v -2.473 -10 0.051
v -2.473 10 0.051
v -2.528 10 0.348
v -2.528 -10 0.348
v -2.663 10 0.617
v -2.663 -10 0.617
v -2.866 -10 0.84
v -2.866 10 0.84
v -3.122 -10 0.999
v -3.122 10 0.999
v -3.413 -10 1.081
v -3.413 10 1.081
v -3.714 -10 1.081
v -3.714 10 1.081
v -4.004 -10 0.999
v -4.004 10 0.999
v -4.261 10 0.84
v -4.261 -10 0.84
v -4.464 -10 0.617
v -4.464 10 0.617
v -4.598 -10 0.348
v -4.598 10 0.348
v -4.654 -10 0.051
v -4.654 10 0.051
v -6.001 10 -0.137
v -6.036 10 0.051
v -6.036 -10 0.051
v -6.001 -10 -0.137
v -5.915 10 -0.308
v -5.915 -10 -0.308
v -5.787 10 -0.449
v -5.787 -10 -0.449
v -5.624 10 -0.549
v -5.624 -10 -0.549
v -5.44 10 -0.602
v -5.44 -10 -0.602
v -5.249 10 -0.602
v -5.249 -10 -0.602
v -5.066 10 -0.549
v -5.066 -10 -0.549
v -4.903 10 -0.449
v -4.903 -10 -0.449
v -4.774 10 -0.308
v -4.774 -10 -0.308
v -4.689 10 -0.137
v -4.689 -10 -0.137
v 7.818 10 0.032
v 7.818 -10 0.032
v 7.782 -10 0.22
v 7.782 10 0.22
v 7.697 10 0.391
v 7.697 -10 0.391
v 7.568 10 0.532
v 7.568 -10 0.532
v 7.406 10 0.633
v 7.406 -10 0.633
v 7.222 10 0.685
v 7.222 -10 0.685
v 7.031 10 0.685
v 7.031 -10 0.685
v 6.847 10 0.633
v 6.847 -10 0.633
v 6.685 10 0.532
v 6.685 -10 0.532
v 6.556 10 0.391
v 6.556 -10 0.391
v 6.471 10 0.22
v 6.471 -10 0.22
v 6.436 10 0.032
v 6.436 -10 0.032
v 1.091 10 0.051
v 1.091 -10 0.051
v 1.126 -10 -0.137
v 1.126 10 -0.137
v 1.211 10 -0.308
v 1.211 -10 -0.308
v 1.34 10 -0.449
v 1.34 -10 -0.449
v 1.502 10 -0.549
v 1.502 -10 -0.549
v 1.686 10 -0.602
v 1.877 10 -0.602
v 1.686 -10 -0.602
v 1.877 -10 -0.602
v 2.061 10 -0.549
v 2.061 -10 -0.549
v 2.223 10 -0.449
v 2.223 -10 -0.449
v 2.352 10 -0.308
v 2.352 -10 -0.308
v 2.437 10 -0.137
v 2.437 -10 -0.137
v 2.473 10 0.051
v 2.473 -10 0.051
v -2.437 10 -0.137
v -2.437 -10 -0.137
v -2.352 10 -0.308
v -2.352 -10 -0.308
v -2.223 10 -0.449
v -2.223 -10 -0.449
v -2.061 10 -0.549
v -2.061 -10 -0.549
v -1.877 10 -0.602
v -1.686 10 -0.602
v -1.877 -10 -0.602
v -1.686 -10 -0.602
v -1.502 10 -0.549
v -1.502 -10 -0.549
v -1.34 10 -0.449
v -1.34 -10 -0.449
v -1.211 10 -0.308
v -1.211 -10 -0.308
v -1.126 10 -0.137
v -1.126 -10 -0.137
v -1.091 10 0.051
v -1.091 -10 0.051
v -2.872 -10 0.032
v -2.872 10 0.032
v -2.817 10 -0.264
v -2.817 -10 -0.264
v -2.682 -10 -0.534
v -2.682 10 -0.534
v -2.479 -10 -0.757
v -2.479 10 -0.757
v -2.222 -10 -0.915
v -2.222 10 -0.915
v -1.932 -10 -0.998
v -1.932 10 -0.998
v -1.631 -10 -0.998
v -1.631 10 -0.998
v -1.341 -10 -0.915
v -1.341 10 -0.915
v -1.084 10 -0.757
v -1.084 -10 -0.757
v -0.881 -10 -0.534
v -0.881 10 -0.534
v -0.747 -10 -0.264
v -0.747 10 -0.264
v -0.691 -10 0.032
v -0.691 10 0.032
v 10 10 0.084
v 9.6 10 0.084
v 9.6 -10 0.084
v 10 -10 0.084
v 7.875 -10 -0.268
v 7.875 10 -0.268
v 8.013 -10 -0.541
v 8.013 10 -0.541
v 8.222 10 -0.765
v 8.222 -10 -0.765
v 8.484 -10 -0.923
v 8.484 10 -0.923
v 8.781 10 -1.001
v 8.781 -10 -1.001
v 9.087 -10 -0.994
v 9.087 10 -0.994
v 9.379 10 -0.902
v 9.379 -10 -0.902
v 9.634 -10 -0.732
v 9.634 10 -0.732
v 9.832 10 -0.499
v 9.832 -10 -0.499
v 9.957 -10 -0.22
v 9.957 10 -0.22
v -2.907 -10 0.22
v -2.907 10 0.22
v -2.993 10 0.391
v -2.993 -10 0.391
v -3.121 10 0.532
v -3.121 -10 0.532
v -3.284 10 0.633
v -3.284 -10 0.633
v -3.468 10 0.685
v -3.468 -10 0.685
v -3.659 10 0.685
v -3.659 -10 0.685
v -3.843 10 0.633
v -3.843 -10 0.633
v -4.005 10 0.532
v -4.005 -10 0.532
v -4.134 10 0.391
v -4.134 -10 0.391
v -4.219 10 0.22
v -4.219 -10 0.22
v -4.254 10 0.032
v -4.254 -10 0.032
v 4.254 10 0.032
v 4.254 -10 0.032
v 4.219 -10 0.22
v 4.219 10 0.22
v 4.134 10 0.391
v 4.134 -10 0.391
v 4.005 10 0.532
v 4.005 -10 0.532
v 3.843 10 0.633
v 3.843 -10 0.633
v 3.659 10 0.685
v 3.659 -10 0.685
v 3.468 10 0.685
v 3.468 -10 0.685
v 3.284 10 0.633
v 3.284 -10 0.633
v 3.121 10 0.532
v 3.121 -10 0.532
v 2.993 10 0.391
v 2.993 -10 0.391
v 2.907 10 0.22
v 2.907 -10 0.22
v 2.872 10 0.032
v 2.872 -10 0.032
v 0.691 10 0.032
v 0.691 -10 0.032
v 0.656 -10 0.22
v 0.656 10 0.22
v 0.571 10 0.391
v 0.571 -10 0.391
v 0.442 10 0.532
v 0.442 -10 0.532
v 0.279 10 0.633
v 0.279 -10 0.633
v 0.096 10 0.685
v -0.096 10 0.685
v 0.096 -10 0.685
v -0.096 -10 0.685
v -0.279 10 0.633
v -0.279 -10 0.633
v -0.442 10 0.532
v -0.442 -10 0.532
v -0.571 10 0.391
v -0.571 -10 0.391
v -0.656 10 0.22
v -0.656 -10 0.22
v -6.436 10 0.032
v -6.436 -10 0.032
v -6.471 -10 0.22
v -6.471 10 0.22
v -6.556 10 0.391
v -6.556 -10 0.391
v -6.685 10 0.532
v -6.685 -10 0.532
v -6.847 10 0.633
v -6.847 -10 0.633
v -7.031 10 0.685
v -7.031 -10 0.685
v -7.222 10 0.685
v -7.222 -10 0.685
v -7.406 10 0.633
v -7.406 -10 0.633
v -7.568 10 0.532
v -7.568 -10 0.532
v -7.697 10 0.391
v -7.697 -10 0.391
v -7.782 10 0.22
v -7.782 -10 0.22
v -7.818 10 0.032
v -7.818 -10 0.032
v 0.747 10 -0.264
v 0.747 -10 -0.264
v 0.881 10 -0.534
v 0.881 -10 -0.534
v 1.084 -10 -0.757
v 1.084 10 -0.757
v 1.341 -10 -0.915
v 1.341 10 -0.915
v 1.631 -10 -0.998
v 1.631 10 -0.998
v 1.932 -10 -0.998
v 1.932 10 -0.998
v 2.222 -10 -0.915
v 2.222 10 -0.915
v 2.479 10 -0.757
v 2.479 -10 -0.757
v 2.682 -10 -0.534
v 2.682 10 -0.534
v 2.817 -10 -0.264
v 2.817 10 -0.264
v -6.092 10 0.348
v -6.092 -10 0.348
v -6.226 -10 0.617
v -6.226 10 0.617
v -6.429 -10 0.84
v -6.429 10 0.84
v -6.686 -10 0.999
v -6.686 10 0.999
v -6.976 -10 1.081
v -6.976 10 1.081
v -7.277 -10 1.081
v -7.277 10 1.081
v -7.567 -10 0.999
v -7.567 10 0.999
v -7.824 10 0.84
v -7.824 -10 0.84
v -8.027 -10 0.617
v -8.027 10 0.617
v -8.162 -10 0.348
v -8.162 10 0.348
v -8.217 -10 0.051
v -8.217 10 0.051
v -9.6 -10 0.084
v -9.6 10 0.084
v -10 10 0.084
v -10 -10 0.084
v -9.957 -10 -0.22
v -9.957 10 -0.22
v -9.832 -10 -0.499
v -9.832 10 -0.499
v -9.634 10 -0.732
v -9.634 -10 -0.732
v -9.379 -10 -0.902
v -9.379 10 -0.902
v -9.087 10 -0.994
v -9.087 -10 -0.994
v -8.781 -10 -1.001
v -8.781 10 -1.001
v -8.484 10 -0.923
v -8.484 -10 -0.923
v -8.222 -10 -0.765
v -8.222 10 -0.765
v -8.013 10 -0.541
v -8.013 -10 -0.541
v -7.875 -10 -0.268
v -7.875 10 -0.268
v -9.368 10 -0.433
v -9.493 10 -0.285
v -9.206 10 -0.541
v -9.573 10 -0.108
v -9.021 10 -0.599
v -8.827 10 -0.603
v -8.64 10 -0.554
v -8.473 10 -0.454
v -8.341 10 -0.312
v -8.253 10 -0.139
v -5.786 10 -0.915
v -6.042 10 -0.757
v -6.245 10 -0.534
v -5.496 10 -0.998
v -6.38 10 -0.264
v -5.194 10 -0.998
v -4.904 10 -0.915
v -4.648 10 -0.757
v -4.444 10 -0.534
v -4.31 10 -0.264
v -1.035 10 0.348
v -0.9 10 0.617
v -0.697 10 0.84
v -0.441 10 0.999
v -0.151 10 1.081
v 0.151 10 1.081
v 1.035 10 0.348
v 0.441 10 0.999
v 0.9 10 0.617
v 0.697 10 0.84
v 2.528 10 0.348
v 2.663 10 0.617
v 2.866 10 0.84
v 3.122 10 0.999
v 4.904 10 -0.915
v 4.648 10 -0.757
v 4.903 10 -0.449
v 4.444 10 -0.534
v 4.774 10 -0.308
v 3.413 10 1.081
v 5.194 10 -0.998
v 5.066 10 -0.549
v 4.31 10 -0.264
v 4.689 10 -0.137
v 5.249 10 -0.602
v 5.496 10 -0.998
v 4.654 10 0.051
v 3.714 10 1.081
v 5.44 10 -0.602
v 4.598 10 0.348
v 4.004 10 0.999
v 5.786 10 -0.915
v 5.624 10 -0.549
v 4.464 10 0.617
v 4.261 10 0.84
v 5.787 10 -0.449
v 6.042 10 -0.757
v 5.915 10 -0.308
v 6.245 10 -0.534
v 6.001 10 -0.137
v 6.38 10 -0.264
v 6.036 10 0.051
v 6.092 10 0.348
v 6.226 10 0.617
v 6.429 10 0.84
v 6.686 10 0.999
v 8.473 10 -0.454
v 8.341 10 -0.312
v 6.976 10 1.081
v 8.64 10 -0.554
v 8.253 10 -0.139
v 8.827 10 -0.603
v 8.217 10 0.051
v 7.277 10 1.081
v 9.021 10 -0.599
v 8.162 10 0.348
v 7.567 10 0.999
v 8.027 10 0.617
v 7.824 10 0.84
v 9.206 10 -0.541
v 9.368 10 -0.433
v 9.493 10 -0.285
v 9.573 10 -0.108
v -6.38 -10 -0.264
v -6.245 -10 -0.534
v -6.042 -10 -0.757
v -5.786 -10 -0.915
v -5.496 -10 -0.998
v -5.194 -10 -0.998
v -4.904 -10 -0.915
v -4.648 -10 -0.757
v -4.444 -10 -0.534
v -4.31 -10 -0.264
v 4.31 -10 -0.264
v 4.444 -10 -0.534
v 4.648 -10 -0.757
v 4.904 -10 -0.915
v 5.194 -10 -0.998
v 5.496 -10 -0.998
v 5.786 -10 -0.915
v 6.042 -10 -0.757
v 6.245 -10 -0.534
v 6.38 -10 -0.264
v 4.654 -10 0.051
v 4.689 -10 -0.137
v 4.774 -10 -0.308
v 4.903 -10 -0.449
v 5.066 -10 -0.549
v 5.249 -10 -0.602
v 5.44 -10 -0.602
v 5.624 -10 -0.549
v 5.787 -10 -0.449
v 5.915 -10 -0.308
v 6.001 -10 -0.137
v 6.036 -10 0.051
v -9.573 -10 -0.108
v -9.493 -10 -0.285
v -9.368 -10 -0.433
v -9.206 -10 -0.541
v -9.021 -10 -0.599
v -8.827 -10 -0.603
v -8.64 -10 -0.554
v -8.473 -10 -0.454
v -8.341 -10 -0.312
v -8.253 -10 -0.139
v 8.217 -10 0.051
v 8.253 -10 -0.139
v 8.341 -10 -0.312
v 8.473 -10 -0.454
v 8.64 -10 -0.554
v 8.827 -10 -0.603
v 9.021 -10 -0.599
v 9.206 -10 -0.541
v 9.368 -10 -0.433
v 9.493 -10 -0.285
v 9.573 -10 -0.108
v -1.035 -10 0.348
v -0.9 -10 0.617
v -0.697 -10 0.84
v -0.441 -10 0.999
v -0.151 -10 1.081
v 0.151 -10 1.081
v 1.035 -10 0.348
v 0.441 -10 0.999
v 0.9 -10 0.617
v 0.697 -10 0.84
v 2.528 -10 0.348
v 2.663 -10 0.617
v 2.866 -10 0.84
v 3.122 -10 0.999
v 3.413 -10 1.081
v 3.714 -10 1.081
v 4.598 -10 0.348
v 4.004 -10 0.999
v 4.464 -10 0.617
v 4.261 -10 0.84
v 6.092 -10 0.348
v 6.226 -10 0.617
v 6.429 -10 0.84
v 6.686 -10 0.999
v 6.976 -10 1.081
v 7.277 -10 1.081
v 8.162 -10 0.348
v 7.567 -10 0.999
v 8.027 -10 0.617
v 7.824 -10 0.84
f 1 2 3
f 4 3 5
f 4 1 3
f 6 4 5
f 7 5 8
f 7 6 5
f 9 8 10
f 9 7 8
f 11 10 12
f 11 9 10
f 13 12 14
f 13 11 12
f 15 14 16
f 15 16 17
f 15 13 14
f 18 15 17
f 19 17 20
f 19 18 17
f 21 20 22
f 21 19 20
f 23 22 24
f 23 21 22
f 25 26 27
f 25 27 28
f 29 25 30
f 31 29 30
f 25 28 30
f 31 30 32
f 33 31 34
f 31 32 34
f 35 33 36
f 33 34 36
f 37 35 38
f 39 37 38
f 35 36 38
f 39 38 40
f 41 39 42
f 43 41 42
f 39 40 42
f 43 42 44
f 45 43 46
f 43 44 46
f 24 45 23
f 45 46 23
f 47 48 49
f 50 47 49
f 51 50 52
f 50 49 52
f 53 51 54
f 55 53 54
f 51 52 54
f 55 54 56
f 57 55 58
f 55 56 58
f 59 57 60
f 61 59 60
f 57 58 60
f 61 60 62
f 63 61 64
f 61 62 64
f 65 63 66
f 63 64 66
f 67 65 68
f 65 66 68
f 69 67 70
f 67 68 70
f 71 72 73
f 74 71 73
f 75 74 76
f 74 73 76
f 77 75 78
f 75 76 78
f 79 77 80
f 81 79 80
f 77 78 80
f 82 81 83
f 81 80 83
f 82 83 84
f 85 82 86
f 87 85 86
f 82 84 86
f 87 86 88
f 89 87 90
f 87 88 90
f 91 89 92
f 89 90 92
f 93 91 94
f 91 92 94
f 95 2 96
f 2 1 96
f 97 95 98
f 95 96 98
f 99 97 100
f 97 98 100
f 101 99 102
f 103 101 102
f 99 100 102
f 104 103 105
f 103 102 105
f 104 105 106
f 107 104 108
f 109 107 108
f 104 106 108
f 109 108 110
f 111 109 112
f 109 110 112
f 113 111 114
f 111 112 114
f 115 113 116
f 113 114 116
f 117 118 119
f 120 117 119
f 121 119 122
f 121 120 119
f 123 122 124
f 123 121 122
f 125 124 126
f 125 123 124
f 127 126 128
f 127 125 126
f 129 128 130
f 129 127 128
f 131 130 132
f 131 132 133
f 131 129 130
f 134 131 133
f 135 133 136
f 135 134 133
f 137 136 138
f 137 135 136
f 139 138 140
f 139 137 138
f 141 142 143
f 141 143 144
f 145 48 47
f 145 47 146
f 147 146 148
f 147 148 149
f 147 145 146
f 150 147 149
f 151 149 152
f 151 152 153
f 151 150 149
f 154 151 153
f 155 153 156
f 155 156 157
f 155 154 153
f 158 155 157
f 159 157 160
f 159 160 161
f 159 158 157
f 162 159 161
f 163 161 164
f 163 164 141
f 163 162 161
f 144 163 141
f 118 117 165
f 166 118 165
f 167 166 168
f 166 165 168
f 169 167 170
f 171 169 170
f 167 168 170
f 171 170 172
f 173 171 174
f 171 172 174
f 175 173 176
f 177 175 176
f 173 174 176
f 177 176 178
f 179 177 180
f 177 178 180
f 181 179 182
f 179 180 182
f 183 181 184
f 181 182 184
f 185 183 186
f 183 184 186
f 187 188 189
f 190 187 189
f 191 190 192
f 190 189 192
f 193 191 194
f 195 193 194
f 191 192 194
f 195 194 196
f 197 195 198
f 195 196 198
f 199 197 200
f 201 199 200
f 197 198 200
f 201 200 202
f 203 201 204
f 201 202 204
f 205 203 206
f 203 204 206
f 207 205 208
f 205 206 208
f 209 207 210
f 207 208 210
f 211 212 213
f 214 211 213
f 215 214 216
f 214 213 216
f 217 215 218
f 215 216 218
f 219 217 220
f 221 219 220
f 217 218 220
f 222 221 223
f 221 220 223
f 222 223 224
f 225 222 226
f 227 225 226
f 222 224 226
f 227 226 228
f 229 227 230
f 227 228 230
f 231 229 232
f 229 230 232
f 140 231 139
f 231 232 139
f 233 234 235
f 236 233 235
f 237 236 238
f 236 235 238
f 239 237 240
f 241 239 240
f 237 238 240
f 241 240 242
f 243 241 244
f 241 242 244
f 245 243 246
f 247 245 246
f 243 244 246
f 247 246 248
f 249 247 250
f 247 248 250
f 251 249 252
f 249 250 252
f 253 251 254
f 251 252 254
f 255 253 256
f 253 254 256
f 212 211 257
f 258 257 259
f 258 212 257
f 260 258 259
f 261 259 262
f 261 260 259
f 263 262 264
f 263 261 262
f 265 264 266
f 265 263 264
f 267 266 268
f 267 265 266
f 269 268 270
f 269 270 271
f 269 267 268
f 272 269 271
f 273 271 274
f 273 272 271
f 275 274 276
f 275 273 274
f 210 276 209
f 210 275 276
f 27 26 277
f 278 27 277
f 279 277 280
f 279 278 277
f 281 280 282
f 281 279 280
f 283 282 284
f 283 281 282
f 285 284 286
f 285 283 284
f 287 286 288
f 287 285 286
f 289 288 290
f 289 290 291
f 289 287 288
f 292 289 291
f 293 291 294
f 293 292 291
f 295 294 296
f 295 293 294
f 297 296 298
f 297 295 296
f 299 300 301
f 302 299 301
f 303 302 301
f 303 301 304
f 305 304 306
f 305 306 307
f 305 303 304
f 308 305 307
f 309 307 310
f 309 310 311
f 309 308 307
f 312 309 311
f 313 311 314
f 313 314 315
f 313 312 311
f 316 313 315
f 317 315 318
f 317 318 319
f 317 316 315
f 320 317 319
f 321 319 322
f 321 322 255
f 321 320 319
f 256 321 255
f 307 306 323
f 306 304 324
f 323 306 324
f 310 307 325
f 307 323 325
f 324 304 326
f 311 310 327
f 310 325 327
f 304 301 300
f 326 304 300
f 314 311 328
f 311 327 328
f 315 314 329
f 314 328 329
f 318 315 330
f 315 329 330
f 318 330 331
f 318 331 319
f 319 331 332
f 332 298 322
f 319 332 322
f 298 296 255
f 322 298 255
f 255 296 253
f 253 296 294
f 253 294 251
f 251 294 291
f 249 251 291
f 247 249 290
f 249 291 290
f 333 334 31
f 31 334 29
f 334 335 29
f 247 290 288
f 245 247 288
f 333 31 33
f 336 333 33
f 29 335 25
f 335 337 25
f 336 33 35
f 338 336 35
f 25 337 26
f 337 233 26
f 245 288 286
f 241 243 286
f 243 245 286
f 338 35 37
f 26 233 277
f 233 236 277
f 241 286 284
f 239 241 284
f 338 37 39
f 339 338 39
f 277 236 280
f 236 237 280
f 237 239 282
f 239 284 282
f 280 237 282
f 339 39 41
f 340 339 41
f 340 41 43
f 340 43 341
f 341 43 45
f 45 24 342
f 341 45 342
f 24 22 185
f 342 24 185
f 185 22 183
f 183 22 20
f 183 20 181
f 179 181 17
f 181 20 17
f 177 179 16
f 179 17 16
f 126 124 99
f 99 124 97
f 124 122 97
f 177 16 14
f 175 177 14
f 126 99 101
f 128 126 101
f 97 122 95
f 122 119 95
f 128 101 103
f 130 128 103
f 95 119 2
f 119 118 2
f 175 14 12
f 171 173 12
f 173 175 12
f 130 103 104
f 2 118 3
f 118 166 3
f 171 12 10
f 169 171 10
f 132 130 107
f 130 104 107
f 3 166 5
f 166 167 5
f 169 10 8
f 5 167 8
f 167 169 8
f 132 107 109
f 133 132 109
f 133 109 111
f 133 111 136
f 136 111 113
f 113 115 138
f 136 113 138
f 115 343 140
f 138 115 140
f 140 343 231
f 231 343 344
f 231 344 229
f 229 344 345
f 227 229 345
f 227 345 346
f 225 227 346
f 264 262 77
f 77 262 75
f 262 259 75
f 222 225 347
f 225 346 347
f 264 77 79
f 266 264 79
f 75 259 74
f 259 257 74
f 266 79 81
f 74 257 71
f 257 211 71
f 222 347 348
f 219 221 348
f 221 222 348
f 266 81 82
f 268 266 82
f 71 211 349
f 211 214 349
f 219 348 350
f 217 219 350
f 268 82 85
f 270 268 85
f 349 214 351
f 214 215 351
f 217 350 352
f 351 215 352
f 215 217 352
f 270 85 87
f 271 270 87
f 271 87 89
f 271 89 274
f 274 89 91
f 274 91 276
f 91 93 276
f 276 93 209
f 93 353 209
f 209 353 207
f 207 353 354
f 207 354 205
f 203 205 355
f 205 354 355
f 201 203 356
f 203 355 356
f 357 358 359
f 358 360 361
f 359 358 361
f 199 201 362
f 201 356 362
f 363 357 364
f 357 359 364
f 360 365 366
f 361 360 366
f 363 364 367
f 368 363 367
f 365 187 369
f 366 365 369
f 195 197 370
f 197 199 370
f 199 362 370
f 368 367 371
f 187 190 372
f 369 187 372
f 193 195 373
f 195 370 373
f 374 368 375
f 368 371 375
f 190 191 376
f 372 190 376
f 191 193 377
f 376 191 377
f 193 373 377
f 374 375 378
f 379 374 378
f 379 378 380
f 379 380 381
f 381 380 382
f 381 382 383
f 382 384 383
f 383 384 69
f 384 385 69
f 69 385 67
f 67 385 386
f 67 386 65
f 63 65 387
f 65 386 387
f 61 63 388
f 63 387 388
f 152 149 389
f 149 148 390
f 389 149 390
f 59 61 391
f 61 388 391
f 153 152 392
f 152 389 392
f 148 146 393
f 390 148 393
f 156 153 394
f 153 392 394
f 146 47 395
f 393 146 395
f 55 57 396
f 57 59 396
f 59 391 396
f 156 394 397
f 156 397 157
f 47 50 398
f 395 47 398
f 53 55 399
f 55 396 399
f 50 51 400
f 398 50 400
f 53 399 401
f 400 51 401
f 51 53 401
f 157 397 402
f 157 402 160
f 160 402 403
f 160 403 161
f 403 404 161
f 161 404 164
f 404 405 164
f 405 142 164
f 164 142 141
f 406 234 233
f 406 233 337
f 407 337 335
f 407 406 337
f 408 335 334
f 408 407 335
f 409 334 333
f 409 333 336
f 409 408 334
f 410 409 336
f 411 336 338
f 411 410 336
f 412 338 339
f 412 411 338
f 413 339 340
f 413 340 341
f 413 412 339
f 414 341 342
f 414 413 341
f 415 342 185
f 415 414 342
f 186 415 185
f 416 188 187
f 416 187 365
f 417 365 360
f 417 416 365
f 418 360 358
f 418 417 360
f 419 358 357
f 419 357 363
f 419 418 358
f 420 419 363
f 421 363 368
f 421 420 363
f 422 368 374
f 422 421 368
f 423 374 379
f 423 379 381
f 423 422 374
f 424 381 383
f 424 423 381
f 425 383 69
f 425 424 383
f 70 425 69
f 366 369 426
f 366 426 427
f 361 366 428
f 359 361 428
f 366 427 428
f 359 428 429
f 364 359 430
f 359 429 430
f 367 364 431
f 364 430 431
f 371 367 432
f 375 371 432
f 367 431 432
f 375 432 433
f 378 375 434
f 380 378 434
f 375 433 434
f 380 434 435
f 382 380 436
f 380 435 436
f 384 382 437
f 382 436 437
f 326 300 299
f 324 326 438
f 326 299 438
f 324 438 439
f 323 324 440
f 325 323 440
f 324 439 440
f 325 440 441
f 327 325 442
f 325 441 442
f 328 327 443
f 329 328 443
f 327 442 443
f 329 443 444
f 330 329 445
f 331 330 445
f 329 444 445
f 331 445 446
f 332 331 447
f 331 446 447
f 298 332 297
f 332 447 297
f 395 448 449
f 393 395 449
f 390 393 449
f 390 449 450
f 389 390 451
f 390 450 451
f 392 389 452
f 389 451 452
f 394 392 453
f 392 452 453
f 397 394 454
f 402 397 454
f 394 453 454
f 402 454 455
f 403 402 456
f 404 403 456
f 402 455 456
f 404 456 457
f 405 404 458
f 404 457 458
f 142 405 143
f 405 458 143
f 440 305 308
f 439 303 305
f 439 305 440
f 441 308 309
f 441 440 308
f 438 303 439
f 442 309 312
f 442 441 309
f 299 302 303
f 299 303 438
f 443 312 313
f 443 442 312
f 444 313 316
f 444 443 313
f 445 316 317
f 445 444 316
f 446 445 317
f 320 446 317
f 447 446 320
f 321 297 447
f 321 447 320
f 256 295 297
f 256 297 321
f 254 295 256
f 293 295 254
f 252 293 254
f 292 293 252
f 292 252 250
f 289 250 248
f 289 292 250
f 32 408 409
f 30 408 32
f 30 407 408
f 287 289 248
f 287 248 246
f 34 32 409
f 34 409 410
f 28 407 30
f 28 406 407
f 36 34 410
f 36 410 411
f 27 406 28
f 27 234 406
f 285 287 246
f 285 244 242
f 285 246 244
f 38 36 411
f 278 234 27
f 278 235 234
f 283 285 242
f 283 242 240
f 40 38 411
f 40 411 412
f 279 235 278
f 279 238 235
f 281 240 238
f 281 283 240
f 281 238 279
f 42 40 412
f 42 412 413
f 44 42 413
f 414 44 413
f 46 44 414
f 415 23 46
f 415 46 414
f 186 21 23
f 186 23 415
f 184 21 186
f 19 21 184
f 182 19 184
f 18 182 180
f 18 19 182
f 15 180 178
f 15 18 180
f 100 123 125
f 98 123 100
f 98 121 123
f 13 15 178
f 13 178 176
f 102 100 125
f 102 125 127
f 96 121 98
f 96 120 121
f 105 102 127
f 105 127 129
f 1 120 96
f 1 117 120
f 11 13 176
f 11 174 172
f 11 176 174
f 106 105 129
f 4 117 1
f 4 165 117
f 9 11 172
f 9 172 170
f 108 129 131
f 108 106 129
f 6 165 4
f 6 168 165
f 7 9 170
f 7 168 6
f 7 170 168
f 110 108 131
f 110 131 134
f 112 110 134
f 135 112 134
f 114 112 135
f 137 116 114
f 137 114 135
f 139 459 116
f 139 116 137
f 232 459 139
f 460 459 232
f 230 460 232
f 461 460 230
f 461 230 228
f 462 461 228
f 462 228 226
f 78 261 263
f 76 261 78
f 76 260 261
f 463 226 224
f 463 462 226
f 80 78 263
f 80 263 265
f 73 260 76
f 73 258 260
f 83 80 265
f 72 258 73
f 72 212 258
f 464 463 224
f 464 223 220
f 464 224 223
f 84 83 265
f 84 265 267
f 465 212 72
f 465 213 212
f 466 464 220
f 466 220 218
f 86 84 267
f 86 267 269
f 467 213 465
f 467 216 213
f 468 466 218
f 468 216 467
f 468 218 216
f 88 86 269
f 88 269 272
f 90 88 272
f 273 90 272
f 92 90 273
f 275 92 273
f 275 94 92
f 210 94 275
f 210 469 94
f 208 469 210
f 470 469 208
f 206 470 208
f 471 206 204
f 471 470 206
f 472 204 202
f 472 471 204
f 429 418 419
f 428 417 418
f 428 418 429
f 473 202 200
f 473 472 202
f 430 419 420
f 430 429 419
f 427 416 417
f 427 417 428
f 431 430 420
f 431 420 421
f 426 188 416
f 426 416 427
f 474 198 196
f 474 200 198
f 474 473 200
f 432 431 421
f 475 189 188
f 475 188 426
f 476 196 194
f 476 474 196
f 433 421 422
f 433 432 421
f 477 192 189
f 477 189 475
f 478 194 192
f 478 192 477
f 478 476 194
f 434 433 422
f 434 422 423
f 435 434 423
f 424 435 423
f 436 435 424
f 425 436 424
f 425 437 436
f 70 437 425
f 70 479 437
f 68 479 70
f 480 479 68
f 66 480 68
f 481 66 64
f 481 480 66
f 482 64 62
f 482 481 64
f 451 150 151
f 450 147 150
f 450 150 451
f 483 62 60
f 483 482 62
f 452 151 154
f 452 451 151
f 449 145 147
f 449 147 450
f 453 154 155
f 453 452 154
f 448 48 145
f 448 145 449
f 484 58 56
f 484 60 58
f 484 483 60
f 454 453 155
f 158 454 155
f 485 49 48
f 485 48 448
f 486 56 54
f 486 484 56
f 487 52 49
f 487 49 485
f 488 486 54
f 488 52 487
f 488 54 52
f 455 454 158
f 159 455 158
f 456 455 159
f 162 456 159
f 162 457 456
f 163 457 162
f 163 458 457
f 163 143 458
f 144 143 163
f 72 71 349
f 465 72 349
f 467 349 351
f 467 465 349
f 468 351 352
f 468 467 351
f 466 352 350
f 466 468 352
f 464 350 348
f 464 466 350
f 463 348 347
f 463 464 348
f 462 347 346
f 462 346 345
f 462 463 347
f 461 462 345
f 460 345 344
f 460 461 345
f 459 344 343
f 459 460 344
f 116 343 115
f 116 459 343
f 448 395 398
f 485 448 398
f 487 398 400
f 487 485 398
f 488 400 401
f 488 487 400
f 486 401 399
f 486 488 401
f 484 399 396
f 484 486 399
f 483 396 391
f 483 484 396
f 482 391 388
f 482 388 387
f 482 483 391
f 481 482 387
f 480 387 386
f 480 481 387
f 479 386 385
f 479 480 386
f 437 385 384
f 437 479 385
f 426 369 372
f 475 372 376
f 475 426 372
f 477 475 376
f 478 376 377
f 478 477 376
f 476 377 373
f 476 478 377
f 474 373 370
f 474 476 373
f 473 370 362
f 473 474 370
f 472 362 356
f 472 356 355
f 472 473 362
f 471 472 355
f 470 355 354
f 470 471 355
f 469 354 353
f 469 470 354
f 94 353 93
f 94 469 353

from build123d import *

# Parameters (mm, degrees)
PAD_DEPTH = 10


with BuildPart() as part:
    # Sketch → Pad (new body, symmetric)
    with BuildSketch(Plane.XZ):
        with BuildLine():
            ThreePointArc((-6.03596, 0.051174), (-7.12656, 1.0918), (-8.21716, 0.051174))
            ThreePointArc((-9.6, 0.0836), (-8.924417, -0.60801), (-8.21716, 0.051174))
            Line((-9.6, 0.0836), (-10, 0.0836))
            ThreePointArc((-10, 0.0836), (-8.933794, -1.0079), (-7.8176, 0.032426))
            ThreePointArc((-6.43552, 0.032426), (-7.12656, 0.6918), (-7.8176, 0.032426))
            ThreePointArc((-6.43552, 0.032426), (-5.34492, -1.0082), (-4.25432, 0.032426))
            ThreePointArc((-2.87224, 0.032426), (-3.56328, 0.6918), (-4.25432, 0.032426))
            ThreePointArc((-2.87224, 0.032426), (-1.78164, -1.0082), (-0.69104, 0.032426))
            ThreePointArc((0.69104, 0.032426), (0, 0.6918), (-0.69104, 0.032426))
            ThreePointArc((0.69104, 0.032426), (1.78164, -1.0082), (2.87224, 0.032426))
            ThreePointArc((4.25432, 0.032426), (3.56328, 0.6918), (2.87224, 0.032426))
            ThreePointArc((4.25432, 0.032426), (5.34492, -1.0082), (6.43552, 0.032426))
            ThreePointArc((7.8176, 0.032426), (7.12656, 0.6918), (6.43552, 0.032426))
            ThreePointArc((7.8176, 0.032426), (8.933794, -1.0079), (10, 0.0836))
            Line((9.6, 0.0836), (10, 0.0836))
            ThreePointArc((8.21716, 0.051174), (8.924417, -0.60801), (9.6, 0.0836))
            ThreePointArc((8.21716, 0.051174), (7.12656, 1.0918), (6.03596, 0.051174))
            ThreePointArc((4.65388, 0.051174), (5.34492, -0.6082), (6.03596, 0.051174))
            ThreePointArc((4.65388, 0.051174), (3.56328, 1.0918), (2.47268, 0.051174))
            ThreePointArc((1.0906, 0.051174), (1.78164, -0.6082), (2.47268, 0.051174))
            ThreePointArc((1.0906, 0.051174), (0, 1.0918), (-1.0906, 0.051174))
            ThreePointArc((-2.47268, 0.051174), (-1.78164, -0.6082), (-1.0906, 0.051174))
            ThreePointArc((-2.47268, 0.051174), (-3.56328, 1.0918), (-4.65388, 0.051174))
            ThreePointArc((-6.03596, 0.051174), (-5.34492, -0.6082), (-4.65388, 0.051174))
        make_face()
    extrude(amount=PAD_DEPTH, both=True)


solid = part.part
